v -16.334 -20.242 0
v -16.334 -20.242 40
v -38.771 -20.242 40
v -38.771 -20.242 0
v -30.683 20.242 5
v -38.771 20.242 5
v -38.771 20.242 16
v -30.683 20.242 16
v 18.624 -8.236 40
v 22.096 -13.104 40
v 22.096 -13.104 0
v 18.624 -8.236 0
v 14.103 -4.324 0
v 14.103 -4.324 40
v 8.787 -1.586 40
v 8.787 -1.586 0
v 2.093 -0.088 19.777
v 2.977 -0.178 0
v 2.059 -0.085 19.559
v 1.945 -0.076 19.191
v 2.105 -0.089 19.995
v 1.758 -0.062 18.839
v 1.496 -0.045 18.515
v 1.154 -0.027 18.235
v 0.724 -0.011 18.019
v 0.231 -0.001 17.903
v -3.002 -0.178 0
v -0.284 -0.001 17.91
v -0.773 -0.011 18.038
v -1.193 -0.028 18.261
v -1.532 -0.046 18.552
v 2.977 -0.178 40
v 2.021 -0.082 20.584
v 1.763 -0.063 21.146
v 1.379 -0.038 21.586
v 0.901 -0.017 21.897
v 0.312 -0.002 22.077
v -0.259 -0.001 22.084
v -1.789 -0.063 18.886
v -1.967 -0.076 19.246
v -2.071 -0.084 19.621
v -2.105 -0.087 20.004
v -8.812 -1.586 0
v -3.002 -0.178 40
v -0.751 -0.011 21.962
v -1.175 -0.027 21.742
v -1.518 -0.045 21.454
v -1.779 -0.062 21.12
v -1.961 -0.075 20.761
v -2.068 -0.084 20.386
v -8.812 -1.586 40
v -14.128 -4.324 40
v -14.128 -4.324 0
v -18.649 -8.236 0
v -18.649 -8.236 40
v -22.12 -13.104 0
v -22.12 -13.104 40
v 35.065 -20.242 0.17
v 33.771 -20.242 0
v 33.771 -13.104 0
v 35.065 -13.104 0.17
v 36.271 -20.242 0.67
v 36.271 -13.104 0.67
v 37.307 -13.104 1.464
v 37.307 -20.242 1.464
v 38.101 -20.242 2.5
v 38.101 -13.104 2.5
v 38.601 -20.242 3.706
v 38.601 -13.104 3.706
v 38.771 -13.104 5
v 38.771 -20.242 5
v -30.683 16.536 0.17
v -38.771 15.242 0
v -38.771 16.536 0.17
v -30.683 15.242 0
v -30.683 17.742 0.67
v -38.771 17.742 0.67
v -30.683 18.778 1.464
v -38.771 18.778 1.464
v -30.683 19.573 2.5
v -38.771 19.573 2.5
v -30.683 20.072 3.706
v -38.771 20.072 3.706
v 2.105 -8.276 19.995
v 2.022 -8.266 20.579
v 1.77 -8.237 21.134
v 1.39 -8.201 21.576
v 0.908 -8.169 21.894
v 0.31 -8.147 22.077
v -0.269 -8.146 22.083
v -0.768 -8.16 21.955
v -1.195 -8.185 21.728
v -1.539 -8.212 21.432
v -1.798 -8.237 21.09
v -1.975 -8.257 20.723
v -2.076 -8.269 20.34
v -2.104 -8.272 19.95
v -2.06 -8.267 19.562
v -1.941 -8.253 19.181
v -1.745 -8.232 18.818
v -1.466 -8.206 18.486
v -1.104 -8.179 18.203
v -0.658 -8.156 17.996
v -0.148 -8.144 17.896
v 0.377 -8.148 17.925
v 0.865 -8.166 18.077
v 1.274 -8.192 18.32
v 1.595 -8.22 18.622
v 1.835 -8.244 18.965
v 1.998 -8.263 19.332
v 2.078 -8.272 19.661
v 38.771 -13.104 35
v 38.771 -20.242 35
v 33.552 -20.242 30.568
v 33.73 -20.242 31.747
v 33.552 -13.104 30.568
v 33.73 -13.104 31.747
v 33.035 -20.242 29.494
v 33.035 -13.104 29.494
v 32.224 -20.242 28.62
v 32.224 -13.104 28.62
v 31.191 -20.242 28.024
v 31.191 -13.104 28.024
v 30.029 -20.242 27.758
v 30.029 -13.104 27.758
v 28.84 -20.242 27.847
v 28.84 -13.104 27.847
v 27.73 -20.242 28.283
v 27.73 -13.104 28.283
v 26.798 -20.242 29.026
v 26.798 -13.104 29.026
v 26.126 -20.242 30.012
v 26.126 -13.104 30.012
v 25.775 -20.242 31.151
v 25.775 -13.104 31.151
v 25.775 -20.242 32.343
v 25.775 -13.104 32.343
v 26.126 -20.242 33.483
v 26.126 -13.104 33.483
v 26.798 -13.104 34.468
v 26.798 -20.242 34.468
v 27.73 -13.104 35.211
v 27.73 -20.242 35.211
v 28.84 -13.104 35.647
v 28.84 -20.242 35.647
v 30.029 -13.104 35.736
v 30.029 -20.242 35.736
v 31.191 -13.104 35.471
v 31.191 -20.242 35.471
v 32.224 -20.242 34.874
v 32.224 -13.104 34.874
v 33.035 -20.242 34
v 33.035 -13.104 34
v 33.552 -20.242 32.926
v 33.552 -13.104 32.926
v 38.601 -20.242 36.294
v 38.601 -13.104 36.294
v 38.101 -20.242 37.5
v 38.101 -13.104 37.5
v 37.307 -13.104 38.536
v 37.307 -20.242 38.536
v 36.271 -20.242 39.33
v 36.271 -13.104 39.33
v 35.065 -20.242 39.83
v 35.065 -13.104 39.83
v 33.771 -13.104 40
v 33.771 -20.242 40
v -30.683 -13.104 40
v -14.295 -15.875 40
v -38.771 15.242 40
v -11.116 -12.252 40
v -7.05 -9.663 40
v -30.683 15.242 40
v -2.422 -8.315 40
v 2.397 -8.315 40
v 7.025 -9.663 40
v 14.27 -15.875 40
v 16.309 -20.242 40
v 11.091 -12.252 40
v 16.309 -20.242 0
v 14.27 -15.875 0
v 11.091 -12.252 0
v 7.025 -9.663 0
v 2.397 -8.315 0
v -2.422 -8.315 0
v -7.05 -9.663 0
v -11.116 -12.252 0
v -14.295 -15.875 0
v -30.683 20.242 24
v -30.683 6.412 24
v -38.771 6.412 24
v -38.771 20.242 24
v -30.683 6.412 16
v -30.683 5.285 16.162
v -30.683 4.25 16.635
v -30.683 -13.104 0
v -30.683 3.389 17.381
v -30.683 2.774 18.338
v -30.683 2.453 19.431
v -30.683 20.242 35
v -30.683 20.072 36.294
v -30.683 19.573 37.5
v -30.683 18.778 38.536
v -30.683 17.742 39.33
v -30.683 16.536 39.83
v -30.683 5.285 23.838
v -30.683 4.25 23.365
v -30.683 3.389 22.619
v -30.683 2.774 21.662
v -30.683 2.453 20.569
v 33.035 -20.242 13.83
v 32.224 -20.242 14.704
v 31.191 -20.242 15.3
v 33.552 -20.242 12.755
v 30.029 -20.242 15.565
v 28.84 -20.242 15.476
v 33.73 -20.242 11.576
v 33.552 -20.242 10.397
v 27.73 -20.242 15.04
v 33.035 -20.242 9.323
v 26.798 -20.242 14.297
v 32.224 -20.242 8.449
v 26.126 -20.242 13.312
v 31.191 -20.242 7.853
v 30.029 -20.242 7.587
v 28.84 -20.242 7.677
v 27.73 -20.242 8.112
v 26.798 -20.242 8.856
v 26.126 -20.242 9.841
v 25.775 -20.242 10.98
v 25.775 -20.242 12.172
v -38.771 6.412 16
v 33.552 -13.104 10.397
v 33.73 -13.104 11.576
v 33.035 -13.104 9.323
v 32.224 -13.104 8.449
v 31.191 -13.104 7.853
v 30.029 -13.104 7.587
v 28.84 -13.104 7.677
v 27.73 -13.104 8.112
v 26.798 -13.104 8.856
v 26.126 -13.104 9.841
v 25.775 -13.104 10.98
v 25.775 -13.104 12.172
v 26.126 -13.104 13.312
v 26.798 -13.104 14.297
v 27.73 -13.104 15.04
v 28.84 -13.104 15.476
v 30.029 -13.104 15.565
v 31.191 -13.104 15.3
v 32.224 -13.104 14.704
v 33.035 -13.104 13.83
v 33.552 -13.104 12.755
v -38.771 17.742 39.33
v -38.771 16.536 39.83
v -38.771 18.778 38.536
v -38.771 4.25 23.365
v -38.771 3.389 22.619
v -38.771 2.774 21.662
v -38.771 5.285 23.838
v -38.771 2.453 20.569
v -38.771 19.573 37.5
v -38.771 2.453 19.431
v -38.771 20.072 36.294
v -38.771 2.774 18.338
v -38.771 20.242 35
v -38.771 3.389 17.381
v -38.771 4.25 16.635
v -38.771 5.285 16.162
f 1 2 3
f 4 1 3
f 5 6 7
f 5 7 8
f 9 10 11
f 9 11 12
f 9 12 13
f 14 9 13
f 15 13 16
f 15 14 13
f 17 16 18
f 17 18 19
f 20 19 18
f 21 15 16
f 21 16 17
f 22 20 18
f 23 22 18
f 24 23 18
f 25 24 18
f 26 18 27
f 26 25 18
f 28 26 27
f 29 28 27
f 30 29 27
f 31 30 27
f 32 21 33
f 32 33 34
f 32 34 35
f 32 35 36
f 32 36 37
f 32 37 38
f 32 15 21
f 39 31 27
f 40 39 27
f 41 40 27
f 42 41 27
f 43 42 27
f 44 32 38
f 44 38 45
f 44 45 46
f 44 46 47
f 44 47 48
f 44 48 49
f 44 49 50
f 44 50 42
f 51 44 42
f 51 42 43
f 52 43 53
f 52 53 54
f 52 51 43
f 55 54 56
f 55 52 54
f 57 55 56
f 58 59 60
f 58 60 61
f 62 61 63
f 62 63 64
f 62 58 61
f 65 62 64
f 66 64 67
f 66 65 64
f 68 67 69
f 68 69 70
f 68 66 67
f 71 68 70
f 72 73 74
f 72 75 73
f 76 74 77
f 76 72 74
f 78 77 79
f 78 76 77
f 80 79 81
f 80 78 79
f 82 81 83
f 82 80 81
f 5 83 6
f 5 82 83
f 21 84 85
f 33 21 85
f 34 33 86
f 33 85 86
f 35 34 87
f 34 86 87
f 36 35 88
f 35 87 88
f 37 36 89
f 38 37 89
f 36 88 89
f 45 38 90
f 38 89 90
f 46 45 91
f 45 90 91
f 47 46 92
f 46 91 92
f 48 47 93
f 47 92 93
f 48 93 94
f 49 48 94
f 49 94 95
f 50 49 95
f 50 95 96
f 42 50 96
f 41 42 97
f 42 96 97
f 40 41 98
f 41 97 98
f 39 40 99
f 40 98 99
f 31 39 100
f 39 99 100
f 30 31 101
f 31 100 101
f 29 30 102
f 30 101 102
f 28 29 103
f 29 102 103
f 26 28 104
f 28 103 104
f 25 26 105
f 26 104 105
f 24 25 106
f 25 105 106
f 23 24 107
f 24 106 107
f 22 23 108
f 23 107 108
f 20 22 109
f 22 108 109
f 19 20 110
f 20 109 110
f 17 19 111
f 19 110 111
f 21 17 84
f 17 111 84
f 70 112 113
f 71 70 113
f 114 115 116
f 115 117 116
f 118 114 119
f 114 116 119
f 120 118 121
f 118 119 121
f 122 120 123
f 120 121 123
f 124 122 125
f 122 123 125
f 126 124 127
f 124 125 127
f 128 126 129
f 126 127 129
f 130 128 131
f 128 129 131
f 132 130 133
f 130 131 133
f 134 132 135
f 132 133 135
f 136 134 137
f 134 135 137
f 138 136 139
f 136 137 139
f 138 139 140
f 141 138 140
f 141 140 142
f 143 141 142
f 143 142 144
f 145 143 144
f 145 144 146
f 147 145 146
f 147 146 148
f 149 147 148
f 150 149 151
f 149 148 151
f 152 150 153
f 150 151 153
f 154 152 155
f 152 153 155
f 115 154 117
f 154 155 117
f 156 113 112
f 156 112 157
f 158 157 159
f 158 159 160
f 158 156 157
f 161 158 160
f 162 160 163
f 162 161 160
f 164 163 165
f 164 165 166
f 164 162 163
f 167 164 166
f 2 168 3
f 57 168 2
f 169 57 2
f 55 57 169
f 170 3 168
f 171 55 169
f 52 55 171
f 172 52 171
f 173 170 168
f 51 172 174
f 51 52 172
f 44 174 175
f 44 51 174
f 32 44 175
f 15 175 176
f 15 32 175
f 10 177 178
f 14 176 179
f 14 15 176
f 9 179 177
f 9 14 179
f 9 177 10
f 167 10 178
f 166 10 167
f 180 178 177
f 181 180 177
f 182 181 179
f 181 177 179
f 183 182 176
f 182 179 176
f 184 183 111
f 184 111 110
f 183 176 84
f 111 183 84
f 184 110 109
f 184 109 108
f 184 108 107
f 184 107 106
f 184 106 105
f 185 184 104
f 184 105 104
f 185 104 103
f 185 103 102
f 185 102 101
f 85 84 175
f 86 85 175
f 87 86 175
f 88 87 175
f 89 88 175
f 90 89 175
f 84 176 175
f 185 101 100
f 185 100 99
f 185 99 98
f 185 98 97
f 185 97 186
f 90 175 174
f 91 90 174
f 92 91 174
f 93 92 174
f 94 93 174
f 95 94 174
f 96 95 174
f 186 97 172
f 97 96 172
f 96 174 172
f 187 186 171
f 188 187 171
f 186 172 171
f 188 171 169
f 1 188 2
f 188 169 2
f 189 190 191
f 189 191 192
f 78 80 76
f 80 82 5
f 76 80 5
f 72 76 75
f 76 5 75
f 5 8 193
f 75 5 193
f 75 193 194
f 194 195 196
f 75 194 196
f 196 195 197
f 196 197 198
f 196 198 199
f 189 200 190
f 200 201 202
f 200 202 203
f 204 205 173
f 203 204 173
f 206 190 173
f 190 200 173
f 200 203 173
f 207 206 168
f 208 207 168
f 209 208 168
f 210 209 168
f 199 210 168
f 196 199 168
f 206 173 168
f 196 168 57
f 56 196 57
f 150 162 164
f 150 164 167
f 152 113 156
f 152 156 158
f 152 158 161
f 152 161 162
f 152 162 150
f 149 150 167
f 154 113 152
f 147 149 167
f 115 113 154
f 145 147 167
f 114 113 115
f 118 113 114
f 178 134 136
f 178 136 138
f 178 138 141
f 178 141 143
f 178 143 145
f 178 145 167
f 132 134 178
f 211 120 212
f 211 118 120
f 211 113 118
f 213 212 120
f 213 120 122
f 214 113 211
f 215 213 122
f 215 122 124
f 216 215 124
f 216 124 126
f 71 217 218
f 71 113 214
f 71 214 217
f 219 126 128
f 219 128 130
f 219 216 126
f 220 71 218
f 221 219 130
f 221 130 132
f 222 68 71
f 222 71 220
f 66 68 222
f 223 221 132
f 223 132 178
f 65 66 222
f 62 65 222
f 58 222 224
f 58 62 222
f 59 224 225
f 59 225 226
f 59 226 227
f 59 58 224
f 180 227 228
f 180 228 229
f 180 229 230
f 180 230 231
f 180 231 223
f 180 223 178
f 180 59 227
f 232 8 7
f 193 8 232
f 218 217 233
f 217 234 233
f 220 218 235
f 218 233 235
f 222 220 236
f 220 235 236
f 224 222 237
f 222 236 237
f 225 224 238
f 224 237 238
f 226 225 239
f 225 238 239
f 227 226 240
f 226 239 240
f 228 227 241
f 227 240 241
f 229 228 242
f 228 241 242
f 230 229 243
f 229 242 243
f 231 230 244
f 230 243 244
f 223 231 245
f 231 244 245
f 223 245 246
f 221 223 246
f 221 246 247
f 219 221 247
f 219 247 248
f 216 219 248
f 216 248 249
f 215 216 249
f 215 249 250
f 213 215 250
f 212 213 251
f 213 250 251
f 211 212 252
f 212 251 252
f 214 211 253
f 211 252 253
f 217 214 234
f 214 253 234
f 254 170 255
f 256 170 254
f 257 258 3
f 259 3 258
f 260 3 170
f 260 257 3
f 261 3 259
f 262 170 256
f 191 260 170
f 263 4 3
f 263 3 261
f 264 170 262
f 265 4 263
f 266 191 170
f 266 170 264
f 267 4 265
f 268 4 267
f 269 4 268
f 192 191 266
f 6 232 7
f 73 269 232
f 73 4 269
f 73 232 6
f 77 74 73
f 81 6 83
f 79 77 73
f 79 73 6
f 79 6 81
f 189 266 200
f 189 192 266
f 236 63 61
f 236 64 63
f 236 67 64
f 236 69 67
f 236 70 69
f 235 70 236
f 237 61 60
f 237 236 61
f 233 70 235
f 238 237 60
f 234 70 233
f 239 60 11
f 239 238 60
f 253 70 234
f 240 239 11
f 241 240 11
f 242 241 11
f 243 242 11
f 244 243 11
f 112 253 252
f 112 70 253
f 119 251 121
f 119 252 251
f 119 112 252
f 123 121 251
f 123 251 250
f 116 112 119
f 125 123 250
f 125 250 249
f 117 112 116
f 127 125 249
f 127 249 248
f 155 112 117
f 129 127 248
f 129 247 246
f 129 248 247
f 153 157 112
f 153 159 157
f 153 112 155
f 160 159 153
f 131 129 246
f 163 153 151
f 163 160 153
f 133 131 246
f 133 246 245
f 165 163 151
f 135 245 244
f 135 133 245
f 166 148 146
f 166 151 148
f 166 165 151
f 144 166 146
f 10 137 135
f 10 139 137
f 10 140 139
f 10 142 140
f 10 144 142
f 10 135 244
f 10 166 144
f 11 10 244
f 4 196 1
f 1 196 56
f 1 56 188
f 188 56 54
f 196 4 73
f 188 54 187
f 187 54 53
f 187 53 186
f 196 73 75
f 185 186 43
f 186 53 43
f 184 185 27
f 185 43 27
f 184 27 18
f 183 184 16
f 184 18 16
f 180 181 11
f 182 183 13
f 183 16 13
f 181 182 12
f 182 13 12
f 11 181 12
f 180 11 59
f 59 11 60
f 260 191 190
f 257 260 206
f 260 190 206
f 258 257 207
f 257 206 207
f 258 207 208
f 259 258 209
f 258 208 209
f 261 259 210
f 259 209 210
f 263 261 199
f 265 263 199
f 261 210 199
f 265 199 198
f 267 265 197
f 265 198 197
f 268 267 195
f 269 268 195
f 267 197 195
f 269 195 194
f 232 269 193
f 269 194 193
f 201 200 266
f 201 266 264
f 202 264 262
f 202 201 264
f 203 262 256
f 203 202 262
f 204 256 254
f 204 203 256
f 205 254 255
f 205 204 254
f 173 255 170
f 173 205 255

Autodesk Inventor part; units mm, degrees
ref_plane "YZ Plane" through (0, 0, 0) normal (1, 0, 0) x (0, 1, 0)
ref_plane "XZ Plane" through (0, 0, 0) normal (0, 1, 0) x (-1, 0, 0)
ref_plane "XY Plane" through (0, 0, 0) normal (0, 0, 1) x (1, 0, 0)
sketch "스케치1" plane through (0, 0, 0) normal (0, 0, 1) x (1, 0, 0)
  line L0 (38.7711, -20.2424) -> (-38.7711, -20.2424)
  line L1 (-38.7711, -20.2424) -> (-38.7711, 20.2424)
  line L2 (-38.7711, 20.2424) -> (38.7711, 20.2424)
  line L3 (38.7711, 20.2424) -> (38.7711, -20.2424)
  line L4 (38.7711, -20.2424) -> (-38.7711, 20.2424) construction
  line L5 (-38.7711, -20.2424) -> (38.7711, 20.2424) construction
  point P0 (0, 0)
extrude "돌출1" add sketch "스케치1" along normal blind 40
sketch "스케치2" plane through (0, 0, 40) normal (0, 0, 1) x (1, 0, 0)
  line L0 (38.7711, 20.2424) -> (-38.7711, 20.2424) projected
  line L1 (-30.6833, 20.2424) -> (-30.6833, -13.1037)
  line L2 (-30.6833, -13.1037) -> (-22.1205, -13.1037)
  line L3 (38.7711, -20.2424) -> (38.7711, 20.2424) projected
  line L4 (38.7711, -13.1037) -> (22.0956, -13.1037)
  arc A0 (22.0956, -13.1037) -> (-22.1205, -13.1037) centre (-0.0125, -25.2018) ccw
  line L5 (-30.6833, 20.2424) -> (38.7711, 20.2424)
  line L6 (38.7711, -13.1037) -> (38.7711, 20.2424)
  circle A1 centre (-0.0125, -25.2018) radius 17.0581
  point P0 (0, 0)
extrude "돌출2" cut sketch "스케치2" against normal blind 40
sketch "스케치3" plane through (-38.7711, -20.2424, 0) normal (0, -1, 0) x (1, 0, 0)
  circle A0 centre (38.7711, 19.9954) radius 2.1048
  point P0 (38.7711, 0)
extrude "돌출3" cut sketch "스케치3" against normal blind 30.75
sketch "스케치4" plane through (22.0956, -13.1037, 40) normal (0, 1, 0) x (1, 0, 0)
  circle A0 centre (7.6344, 28.4237) radius 4
  circle A1 centre (7.6344, 8.2529) radius 4
  point P0 (-22.0956, 40)
  dimension "d7" = 8
  dimension "d8" = 8
extrude "돌출4" cut sketch "스케치4" against normal blind 30.75
sketch "스케치5" plane through (-30.6833, -13.1037, 40) normal (1, 0, 0) x (0, 0, -1)
  line L0 (16, 33.3461) -> (16, 22.7148)
  line L1 (0, 33.3461) -> (40, 33.3461) projected
  line L2 (24, 33.3461) -> (24, 19.5161)
  line L3 (40, 33.3461) -> (40, 0) projected
  line L4 (0, 0) -> (0, 33.3461) projected
  arc A0 (16, 19.5161) -> (24, 19.5161) centre (20, 19.5161) ccw
  line L5 (16, 33.3461) -> (24, 33.3461)
  line L6 (16, 19.5161) -> (16, 22.7148)
  point P0 (40, 13.1037)
  dimension "d11" = 16
  dimension "d12" = 16
extrude "돌출5" cut sketch "스케치5" against normal blind 30.75
fillet "모깎기1" radius 5 4 edges at (-34.7272, 20.2424, 40) (-34.7272, 20.2424, 0) (38.7711, -16.673, 40) (38.7711, -16.673, 0)
properties part number "240628_final3"
